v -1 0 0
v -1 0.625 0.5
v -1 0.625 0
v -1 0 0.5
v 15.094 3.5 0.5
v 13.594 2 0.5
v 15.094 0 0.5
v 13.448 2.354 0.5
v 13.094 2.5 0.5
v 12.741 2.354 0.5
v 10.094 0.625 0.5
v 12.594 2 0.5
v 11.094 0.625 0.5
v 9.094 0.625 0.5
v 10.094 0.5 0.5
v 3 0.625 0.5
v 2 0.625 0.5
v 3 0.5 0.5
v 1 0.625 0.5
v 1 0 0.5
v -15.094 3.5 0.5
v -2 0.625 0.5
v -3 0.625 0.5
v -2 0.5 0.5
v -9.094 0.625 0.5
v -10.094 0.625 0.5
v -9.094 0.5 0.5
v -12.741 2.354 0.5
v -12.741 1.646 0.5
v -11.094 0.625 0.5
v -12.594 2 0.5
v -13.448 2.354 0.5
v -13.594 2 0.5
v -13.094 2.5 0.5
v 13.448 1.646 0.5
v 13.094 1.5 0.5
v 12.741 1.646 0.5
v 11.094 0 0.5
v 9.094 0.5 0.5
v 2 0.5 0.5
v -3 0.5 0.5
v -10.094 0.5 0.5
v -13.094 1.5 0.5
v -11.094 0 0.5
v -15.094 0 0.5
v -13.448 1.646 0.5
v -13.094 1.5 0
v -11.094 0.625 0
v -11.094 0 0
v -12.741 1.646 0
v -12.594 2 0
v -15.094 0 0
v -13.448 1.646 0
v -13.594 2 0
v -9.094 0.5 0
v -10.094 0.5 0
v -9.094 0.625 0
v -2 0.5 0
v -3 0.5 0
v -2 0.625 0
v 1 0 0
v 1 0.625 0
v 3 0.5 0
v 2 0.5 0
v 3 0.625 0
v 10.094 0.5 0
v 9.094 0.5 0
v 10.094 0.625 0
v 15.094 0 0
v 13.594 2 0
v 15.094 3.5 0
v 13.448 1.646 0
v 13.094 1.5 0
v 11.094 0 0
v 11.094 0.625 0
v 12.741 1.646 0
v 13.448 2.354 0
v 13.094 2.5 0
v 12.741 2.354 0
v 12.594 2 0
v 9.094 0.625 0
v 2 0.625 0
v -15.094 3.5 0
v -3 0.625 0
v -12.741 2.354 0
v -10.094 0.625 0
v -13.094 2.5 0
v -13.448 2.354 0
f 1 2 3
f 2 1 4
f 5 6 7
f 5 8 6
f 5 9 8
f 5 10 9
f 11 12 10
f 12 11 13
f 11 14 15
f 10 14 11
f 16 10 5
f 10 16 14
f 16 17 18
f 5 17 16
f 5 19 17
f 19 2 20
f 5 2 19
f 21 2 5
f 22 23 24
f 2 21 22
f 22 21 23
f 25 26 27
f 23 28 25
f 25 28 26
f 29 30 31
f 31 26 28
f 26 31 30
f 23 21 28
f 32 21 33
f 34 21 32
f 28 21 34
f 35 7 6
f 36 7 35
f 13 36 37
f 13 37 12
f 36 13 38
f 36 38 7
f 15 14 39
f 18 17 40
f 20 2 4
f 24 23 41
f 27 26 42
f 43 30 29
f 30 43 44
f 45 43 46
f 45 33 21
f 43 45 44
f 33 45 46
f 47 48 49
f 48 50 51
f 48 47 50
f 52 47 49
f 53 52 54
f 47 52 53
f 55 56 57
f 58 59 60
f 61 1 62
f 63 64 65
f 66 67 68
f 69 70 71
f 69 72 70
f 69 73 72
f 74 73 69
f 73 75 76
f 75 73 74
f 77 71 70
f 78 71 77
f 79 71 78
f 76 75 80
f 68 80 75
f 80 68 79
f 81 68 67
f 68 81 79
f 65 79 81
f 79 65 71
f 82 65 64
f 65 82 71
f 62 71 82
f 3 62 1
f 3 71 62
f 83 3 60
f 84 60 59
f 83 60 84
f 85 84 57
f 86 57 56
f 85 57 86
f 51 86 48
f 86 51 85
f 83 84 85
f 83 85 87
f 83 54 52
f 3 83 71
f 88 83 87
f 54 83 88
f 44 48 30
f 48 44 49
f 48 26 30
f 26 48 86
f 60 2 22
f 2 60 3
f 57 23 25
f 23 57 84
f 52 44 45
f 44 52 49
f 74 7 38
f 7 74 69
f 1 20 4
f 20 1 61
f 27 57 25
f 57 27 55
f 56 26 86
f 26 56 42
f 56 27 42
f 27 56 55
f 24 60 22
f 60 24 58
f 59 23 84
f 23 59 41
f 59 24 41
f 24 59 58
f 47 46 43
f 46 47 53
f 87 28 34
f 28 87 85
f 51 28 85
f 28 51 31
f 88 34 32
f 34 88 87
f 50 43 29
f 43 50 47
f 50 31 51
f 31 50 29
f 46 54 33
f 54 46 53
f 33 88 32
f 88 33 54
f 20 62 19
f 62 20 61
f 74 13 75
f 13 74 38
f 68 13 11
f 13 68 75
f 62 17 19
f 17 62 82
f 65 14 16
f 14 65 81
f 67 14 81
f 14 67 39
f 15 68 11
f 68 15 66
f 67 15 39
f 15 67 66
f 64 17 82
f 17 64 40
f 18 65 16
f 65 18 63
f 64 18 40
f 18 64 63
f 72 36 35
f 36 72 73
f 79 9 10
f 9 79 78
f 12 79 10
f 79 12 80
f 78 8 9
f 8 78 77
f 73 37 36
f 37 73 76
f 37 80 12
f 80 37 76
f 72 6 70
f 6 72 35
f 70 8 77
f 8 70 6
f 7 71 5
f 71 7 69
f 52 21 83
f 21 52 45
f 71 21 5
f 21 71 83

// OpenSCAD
// file: modus.scad
//Corner Joint - allows the sides of two parts to create inlayed corner. Aids with welding.
//need to verify module math is the same throughout all parts.

module cornerjoint(Z,L,H,EndGap,PadL,PadH,CJangle,CJcenter){
    //change so that H = Z of inlayed part (usually 0.5)
    //add center and angle in degrees option, orgin far side of cut out area

     if((CJangle==0)&&(CJcenter==0))
      {    
        translate([0,0,0])
        rotate([0,0,CJangle])
        difference(){
        cube([L,H+PadH,Z]);
        translate([EndGap,H,0])
        cube([PadL,PadH,Z]);
        translate([L-EndGap-PadL,H,0])
        cube([PadL,PadH,Z]);}
      }    
else if((CJangle==90)&&(CJcenter==0))
      {    
        translate([H+PadH,0,0])
        rotate([0,0,CJangle])
        difference(){
        cube([L,H+PadH,Z]);
        translate([EndGap,H,0])
        cube([PadL,PadH,Z]);
        translate([L-EndGap-PadL,H,0])
        cube([PadL,PadH,Z]);}
      }
else if((CJangle==180)&&(CJcenter==0))       
      {    
        translate([L,H+PadH,0])
        rotate([0,0,CJangle])
        difference(){
        cube([L,H+PadH,Z]);
        translate([EndGap,H,0])
        cube([PadL,PadH,Z]);
        translate([L-EndGap-PadL,H,0])
        cube([PadL,PadH,Z]);}
      }
else if((CJangle==270)&&(CJcenter==0))
      {    
        translate([0,L,0])
        rotate([0,0,CJangle])
        difference(){
        cube([L,H+PadH,Z]);
        translate([EndGap,H,0])
        cube([PadL,PadH,Z]);
        translate([L-EndGap-PadL,H,0])
        cube([PadL,PadH,Z]);}
      }  
      
//centered     
   
else if((CJangle==0)&&(CJcenter==1))
      {    
        translate([-L/2,0,0])
        rotate([0,0,CJangle])
        difference(){
        cube([L,H+PadH,Z]);
        translate([EndGap,H,0])
        cube([PadL,PadH,Z]);
        translate([L-EndGap-PadL,H,0])
        cube([PadL,PadH,Z]);}
      }  
else if((CJangle==90)&&(CJcenter==1))
      {    
        translate([0,-L/2,0])
        rotate([0,0,CJangle])
        difference(){
        cube([L,H+PadH,Z]);
        translate([EndGap,H,0])
        cube([PadL,PadH,Z]);
        translate([L-EndGap-PadL,H,0])
        cube([PadL,PadH,Z]);}
      }
else if((CJangle==180)&&(CJcenter==1))       
      {    
        translate([L/2,0,0])
        rotate([0,0,CJangle])
        difference(){
        cube([L,H+PadH,Z]);
        translate([EndGap,H,0])
        cube([PadL,PadH,Z]);
        translate([L-EndGap-PadL,H,0])
        cube([PadL,PadH,Z]);}
      }
else if((CJangle==270)&&(CJcenter==1))
      {    
        translate([0,L/2,0])
        rotate([0,0,CJangle])
        difference(){
        cube([L,H+PadH,Z]);
        translate([EndGap,H,0])
        cube([PadL,PadH,Z]);
        translate([L-EndGap-PadL,H,0])
        cube([PadL,PadH,Z]);}
      }
} //end cornerjoint module

//Tab Insert - used to cut a hole for an abutting part to insert into. Typically aids with welding the two parts.
module tabinsert(X,Y,Z,dGap,cGap,c1,c2,c3,c4,c5,c6,c7,c8,center){
    translate([-dGap-(center*(X/2)),-dGap-(center*(Y/2)),0]){
        //main cut
        cube([X+(dGap*2),Y+(dGap*2),Z]);
        //corner c1c2
        translate([-cGap,(Y+(dGap*2))-c1+cGap,0])
            {
        cube([c2,c1,Z]);}
       //corner c3c4
       translate([(X+(dGap*2))-c3+cGap,(Y+(dGap*2))-c4+cGap,0]){
           cube([c3,c4,Z]);
       }
       //corner c5c6
       translate([(X+(dGap*2))-c6+cGap,-cGap,0])
      {
          cube([c6,c5,Z]);
      }
       
       //corner c7c8 
       translate([-cGap,-cGap,0]){
           cube([c7,c8,Z]);
       }
    
    } //end center translate
} //end tabinsert module
 
// file: vars.scad
brickW=6; 
brickL=12;
brickCH=6;

$fn=8; //defines resolution of circles. 8 is okay for review. 100  or greater should be used for for final dxf export.

dZstandard=0.5; //thickness of steel to be cut for drawer parts
fZstandard=0.5;
aZstandard=0.5; //thickness of steel to be cut for arm parts

fBOLTHOLEstandardD=1; //standard bolts used on frame
sliderodholeOD=1.2; 

dGap=0.03125; //gap between a hole cut's edge and the part sitting within the hole. //D3 appears to use 0.3125, is this in error?

//all parts set to standard thickness below
//off standard preferences can be defined below

//drawer
drawergap=0.0283;  //extra room for drawer to slide in the space between f1 and f4
drawerHgap=0.1884;  //total extra space from drawer sides to frame walls. sum of both sides.

d1z=dZstandard;
d2z=dZstandard;
d3z=dZstandard;
d4z=dZstandard;
d5z=dZstandard;
d6z=dZstandard;
d5z=dZstandard;
d7z=dZstandard;
d8z=dZstandard;
d9z=dZstandard;

//frame
f1x=24.2;
f1y=6;
f1z=0.5;


f2y=3.5;
f2z=fZstandard;

f3x=f1x;
f3y=3.5;
f3z=fZstandard;

f4y=11;
f4z=fZstandard;

f5y=3.5;
f5z=fZstandard;

f6y=8;
f6z=fZstandard;

f8y=brickW;
f8z=fZstandard;
f8boltD=1;

f9y=4.5;
f9x=43.5;  //set based on MAINcylinder
f9z=fZstandard;

f8x=f9x;

f11x=1.25;
f11z=fZstandard;

f13z=fZstandard;

//arms

a1x=4;
a1y=72; //calculate based on drawer cylinder
a1z=aZstandard;

a2x=6;
a2y=72;  //calculate based on drawer cylinder
a2z=aZstandard;

a4z=aZstandard;
a6z=aZstandard;

//
//Input your main cylinder's dimenions here
//
cylinderMAINminC2E=0; //main hydraulic cylinder's distance from center of mounting hole to the end of the shaft when fully compressed.
cylinderMAINmaxC2E=0; //main hydraulic cylinder's distance from center of mounting hole to the end of the shaft when fully extended.

//
//Input your drawer cylinder's dimenions here
//
cylinderDRAWERbodyH=3; //measured when in position, largest length from top to bottom of cylinder
cylinderDRAWERminC2C=0; //drawer's hydraulic cylinder's distance from the center of one mounting hole to the center of the other when fully compressed.
cylinderDRAWERmaxC2C=0; ///drawer's hydraulic cylinder's distance from the center of one mounting hole to the center of the other when fully extended.
cylinderDRAWERrodclevisW=2.5; //width of cylinders' clevis on end of rod
cylinderDRAWERrodclevisID=1;
cylinderDRAWERrodclevisOD=2;
cylinderDRAWERrearclevisW=2.5; //width of mounting clevis cylinder body
cylinderDRAWERrearclevisID=1;
cylinderDRAWERrearclevisOD=2;
cylinderDRAWERrearclevisClearance=3; //usable space around rear clevis pin (in diameter). be aware of hyraulic fittings.

//the following variables are calculated in order of dependence on preceding variables
d3x=brickL+(d2z*2);
d3y=brickCH-d1z;
d4x=brickW+d3z+d3z;
d4y=brickCH-d1z;
d5x=brickL+(d2z*2);
d5y=brickW;
d6x=brickL+(d2z*2);
d6y=brickCH;
d7x=cylinderDRAWERrearclevisClearance;
d7y=a4z+d8z+cylinderDRAWERbodyH;
d9x=cylinderDRAWERbodyH+d6z;
d9y=cylinderDRAWERbodyH+d8z;
d8x=brickL+(d2z*2);
d8y=max(5,(d9x-d6z));   //need to review fundamentals, 5 minimun unless d9 gets larger than d8
d1x=18.5;   //need to come up with a formula
d1y=18;     //need to come up with a formula
d2x=d8y+d6z+brickW+d3z+d5y+d3z;
d2y=brickCH;

f11y=f8y;
f6x=brickL+(d2z*2)+(f9y*2)+drawerHgap;
f8x=43.5;  //need to define based on MAINcylinder inputs


f2x=brickL+(d2z*2)+drawerHgap+(f9y*2)-(1.4*2);  //distance between large cut outs in f9

f5x=brickL+(d2z*2)+drawerHgap+(f9y*2)+(a1x*2); //distance between outer edges of each A1

f4x=f5x-0.5;   //same as f5 but minus 0.25 on each side to give a little overhang
// main file
include <vars.scad>;
use <modus.scad>;

f5p();

module f5p(){
    
difference(){
translate([-(f5x/2),0,0])
cube([f5x,f5y,f5z]);
translate([-(f5x/2),0,0])
cuts();
translate([(f5x/2),0,0])
mirror([1,0,0])
cuts();
} //end difference

module cuts(){
    translate([4,0,0])
    cornerjoint(f5z,(f5x-(4*2)-2)/2,f4z,1,1,0.125,0,0);    

    //arm bolt hole
    translate([(a1x/2),f5y-1.5,0])  //aligns with hole in center of a1x
        cylinder(h = f5z, r = 0.5);
    
    //might add an insert for an A6 type of support
    
} //end cuts module

} //end f5p module
